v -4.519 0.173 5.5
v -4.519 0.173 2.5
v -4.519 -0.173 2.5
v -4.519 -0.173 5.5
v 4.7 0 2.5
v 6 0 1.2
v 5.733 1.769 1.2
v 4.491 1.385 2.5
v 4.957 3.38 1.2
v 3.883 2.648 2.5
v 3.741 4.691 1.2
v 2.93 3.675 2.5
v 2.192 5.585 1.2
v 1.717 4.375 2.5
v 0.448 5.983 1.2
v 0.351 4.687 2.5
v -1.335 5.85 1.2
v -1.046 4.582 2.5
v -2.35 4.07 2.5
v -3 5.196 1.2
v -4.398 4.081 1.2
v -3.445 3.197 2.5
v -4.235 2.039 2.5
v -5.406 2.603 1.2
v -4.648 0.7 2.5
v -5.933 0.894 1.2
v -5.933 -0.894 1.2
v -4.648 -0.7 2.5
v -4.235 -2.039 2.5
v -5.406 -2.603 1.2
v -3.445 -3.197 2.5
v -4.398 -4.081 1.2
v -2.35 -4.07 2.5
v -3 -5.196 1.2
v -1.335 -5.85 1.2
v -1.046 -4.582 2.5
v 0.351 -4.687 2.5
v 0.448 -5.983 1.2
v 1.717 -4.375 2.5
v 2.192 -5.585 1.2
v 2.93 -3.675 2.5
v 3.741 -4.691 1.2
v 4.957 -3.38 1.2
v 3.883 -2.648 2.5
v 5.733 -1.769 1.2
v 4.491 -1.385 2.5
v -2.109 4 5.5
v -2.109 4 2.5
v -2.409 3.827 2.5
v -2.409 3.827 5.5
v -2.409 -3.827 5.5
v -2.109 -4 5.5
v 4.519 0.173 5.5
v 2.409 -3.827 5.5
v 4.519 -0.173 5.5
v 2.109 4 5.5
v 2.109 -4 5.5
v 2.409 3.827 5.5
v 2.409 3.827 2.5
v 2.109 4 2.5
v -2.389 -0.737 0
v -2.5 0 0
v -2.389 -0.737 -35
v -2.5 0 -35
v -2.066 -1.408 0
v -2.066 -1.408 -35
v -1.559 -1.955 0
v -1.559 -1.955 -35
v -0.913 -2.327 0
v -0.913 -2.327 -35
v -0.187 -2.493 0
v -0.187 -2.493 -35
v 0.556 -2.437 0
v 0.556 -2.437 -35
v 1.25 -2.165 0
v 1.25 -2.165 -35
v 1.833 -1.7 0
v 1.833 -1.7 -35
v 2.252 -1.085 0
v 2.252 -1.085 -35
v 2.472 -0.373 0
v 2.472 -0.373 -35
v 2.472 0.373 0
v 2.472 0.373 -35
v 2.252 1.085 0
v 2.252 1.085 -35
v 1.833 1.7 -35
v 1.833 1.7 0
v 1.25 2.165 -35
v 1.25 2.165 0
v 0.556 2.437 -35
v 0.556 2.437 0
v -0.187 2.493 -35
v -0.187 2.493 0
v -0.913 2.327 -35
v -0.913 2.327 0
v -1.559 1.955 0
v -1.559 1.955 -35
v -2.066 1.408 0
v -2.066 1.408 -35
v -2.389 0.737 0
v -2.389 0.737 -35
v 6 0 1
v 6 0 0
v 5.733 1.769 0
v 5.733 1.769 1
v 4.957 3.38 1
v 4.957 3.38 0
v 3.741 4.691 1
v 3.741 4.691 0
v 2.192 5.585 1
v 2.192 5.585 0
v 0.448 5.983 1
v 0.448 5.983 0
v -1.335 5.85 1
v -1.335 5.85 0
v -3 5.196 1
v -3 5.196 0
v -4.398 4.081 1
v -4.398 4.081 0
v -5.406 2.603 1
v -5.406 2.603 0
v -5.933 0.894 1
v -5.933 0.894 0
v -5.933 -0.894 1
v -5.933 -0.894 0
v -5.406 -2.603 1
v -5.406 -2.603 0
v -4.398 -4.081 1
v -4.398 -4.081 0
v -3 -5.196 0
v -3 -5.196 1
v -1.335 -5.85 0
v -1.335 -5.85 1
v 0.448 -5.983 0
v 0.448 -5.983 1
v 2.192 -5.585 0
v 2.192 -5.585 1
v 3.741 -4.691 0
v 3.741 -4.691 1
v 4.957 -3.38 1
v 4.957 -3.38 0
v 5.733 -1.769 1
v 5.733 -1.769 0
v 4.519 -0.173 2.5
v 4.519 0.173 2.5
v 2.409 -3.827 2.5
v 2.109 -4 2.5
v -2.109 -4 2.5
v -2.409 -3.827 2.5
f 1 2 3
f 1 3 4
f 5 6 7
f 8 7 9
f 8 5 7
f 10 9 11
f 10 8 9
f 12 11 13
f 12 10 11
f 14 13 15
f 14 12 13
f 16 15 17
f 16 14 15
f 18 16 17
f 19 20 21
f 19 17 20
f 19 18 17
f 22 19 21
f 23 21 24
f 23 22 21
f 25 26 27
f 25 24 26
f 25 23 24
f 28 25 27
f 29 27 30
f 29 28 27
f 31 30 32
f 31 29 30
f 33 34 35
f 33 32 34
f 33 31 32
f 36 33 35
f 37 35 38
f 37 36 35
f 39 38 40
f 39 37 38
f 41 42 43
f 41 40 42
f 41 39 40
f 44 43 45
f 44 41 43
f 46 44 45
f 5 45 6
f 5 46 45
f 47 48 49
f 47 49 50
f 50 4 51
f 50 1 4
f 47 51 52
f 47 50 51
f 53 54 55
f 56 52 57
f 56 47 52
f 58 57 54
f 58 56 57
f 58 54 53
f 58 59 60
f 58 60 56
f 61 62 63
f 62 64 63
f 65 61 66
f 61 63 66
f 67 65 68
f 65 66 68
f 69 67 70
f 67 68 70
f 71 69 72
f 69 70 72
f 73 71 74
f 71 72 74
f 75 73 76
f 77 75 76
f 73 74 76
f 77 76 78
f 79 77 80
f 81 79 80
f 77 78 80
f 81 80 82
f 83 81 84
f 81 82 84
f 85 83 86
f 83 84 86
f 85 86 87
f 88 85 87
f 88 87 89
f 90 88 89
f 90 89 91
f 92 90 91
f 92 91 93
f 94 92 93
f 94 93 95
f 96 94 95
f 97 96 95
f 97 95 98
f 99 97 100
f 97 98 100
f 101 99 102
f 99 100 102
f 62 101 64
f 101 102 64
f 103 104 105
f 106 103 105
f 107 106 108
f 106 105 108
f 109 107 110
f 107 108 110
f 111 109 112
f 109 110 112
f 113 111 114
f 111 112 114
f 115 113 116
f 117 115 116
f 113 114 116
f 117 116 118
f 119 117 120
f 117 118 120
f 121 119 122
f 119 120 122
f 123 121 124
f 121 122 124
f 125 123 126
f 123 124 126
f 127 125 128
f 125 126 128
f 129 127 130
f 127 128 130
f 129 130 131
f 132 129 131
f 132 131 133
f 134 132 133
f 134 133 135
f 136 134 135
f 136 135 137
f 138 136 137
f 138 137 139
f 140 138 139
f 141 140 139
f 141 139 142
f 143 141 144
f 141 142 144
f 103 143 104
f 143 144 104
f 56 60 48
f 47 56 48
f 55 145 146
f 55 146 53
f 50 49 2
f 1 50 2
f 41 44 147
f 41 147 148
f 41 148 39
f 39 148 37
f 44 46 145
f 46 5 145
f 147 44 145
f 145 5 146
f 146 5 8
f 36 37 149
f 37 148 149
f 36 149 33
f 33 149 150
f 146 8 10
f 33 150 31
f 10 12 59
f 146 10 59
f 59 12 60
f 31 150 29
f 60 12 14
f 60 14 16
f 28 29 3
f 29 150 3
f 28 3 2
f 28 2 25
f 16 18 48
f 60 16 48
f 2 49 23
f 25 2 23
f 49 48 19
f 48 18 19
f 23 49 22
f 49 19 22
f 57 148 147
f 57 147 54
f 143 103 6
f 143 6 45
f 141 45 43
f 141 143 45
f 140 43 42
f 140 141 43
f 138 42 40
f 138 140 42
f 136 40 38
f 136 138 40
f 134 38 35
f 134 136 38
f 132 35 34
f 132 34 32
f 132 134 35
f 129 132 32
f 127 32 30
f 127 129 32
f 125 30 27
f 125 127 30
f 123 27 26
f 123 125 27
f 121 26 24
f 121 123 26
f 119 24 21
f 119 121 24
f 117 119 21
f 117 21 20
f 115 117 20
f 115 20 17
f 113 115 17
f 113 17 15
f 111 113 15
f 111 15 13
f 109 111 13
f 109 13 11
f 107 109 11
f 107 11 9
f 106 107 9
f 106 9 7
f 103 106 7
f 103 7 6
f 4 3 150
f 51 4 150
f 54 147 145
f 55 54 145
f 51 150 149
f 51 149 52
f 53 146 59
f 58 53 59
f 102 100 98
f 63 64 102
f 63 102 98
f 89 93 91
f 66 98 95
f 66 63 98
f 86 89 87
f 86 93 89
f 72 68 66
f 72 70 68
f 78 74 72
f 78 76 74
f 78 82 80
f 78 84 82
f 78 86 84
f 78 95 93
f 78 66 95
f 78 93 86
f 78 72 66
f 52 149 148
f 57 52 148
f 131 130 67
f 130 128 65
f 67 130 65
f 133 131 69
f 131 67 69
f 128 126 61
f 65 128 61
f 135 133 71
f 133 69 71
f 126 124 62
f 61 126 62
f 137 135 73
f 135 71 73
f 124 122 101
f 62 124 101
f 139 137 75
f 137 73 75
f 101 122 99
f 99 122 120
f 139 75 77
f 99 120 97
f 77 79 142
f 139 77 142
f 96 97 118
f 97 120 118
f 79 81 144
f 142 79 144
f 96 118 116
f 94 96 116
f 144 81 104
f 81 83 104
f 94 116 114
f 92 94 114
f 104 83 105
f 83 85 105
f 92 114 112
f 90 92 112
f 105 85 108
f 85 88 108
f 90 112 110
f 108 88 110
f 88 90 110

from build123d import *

# Parameters (mm, degrees)
SKETCH1_W                = 2.5
SKETCH1_H                = 35
SKETCH2_R                = 6
BOSS_EXTRUDE1_DEPTH      = 1
SKETCH3_R                = 4.4
BOSS_EXTRUDE2_DEPTH      = 1.5
CHAMFER1_SIZE            = 1.8
BOSS_EXTRUDE3_DEPTH      = 3
BOSS_EXTRUDE3_DEPTH_BACK = 1.5
CHAMFER2_SIZE            = 0.2
CHAMFER2_EDGE_2_SIZE     = 0.2
CHAMFER2_EDGE_3_SIZE     = 0.2
CHAMFER2_EDGE_4_SIZE     = 0.2
CHAMFER2_EDGE_5_SIZE     = 0.2
CHAMFER2_EDGE_6_SIZE     = 0.2


with BuildPart() as part:
    # Sketch1 → Revolve1 (revolve)
    with BuildSketch(Plane(origin=(0, 0, 0), x_dir=(1, 0, 0), z_dir=(0, 1, 0)), mode=Mode.PRIVATE) as revolve1_sk:
        with Locations((1.25, 17.5)):
            Rectangle(SKETCH1_W, SKETCH1_H)
    revolve(revolve1_sk.sketch.rotate(Axis((0, 0, -35), (0, 0, 1)), 180), axis=Axis((0, 0, -35), (0, 0, 1)))

    # Sketch2 → Boss-Extrude1 (add)
    with BuildSketch(Plane.XY):
        Circle(SKETCH2_R)
    extrude(amount=BOSS_EXTRUDE1_DEPTH)

    # Sketch3 → Boss-Extrude2 (add)
    with BuildSketch(Plane.XY.offset(1)):
        Circle(SKETCH3_R)
    extrude(amount=BOSS_EXTRUDE2_DEPTH)

    # Chamfer1
    # the kernel refuses this chamfer: 1.8 mm, written as the material it adds along each edge
    with BuildSketch(Plane(origin=(0, 0, 1), x_dir=(1, 0, 0), z_dir=(0, -1, 0))) as chamfer1_piece_1_section:
        Polygon((4.4 + CHAMFER1_SIZE, 0), (4.4, CHAMFER1_SIZE), (4.4, 0), align=None)
    chamfer1_piece_1 = revolve(axis=Axis((0, 0, 1), (0, 0, 1)), mode=Mode.PRIVATE)
    chamfer1_piece_1 = chamfer1_piece_1 & Plane(origin=(0, 0, 1.82351745), x_dir=(1, 0, 0), z_dir=(0, 0, -1)) * Cylinder(6, 25, mode=Mode.PRIVATE)
    chamfer1_piece_1 = split(chamfer1_piece_1, bisect_by=Plane(origin=(-5.32351745, 0, 2.5), z_dir=(0, 0, -1)), keep=Keep.TOP, mode=Mode.PRIVATE)
    add(chamfer1_piece_1)

    # Sketch4 → Boss-Extrude3 (add, two sides: drawn at the far end of the back side and taken through both)
    with BuildSketch(Plane.XY.offset(2.5).offset(-BOSS_EXTRUDE3_DEPTH_BACK)):
        Polygon((-2.309401077, 4), (-4.618802154, 0), (-2.309401077, -4), (2.309401077, -4), (4.618802154, 0), (2.309401077, 4), align=None)
    extrude(amount=BOSS_EXTRUDE3_DEPTH + BOSS_EXTRUDE3_DEPTH_BACK)

    # Chamfer2
    chamfer2_edges = [part.edges().sort_by_distance(p)[0] for p in [
        (-2.309401077, 4, 4),
    ]]
    chamfer(chamfer2_edges, length=CHAMFER2_SIZE)

    # Chamfer2 edge 2
    chamfer2_edge_2_edges = [part.edges().sort_by_distance(p)[0] for p in [
        (2.309401077, 4, 4),
    ]]
    chamfer(chamfer2_edge_2_edges, length=CHAMFER2_EDGE_2_SIZE)

    # Chamfer2 edge 3
    chamfer2_edge_3_edges = [part.edges().sort_by_distance(p)[0] for p in [
        (4.618802154, 0, 4),
    ]]
    chamfer(chamfer2_edge_3_edges, length=CHAMFER2_EDGE_3_SIZE)

    # Chamfer2 edge 4
    chamfer2_edge_4_edges = [part.edges().sort_by_distance(p)[0] for p in [
        (2.309401077, -4, 4),
    ]]
    chamfer(chamfer2_edge_4_edges, length=CHAMFER2_EDGE_4_SIZE)

    # Chamfer2 edge 5
    chamfer2_edge_5_edges = [part.edges().sort_by_distance(p)[0] for p in [
        (-2.309401077, -4, 4),
    ]]
    chamfer(chamfer2_edge_5_edges, length=CHAMFER2_EDGE_5_SIZE)

    # Chamfer2 edge 6
    chamfer2_edge_6_edges = [part.edges().sort_by_distance(p)[0] for p in [
        (-4.618802154, 0, 4),
    ]]
    chamfer(chamfer2_edge_6_edges, length=CHAMFER2_EDGE_6_SIZE)


solid = part.part
